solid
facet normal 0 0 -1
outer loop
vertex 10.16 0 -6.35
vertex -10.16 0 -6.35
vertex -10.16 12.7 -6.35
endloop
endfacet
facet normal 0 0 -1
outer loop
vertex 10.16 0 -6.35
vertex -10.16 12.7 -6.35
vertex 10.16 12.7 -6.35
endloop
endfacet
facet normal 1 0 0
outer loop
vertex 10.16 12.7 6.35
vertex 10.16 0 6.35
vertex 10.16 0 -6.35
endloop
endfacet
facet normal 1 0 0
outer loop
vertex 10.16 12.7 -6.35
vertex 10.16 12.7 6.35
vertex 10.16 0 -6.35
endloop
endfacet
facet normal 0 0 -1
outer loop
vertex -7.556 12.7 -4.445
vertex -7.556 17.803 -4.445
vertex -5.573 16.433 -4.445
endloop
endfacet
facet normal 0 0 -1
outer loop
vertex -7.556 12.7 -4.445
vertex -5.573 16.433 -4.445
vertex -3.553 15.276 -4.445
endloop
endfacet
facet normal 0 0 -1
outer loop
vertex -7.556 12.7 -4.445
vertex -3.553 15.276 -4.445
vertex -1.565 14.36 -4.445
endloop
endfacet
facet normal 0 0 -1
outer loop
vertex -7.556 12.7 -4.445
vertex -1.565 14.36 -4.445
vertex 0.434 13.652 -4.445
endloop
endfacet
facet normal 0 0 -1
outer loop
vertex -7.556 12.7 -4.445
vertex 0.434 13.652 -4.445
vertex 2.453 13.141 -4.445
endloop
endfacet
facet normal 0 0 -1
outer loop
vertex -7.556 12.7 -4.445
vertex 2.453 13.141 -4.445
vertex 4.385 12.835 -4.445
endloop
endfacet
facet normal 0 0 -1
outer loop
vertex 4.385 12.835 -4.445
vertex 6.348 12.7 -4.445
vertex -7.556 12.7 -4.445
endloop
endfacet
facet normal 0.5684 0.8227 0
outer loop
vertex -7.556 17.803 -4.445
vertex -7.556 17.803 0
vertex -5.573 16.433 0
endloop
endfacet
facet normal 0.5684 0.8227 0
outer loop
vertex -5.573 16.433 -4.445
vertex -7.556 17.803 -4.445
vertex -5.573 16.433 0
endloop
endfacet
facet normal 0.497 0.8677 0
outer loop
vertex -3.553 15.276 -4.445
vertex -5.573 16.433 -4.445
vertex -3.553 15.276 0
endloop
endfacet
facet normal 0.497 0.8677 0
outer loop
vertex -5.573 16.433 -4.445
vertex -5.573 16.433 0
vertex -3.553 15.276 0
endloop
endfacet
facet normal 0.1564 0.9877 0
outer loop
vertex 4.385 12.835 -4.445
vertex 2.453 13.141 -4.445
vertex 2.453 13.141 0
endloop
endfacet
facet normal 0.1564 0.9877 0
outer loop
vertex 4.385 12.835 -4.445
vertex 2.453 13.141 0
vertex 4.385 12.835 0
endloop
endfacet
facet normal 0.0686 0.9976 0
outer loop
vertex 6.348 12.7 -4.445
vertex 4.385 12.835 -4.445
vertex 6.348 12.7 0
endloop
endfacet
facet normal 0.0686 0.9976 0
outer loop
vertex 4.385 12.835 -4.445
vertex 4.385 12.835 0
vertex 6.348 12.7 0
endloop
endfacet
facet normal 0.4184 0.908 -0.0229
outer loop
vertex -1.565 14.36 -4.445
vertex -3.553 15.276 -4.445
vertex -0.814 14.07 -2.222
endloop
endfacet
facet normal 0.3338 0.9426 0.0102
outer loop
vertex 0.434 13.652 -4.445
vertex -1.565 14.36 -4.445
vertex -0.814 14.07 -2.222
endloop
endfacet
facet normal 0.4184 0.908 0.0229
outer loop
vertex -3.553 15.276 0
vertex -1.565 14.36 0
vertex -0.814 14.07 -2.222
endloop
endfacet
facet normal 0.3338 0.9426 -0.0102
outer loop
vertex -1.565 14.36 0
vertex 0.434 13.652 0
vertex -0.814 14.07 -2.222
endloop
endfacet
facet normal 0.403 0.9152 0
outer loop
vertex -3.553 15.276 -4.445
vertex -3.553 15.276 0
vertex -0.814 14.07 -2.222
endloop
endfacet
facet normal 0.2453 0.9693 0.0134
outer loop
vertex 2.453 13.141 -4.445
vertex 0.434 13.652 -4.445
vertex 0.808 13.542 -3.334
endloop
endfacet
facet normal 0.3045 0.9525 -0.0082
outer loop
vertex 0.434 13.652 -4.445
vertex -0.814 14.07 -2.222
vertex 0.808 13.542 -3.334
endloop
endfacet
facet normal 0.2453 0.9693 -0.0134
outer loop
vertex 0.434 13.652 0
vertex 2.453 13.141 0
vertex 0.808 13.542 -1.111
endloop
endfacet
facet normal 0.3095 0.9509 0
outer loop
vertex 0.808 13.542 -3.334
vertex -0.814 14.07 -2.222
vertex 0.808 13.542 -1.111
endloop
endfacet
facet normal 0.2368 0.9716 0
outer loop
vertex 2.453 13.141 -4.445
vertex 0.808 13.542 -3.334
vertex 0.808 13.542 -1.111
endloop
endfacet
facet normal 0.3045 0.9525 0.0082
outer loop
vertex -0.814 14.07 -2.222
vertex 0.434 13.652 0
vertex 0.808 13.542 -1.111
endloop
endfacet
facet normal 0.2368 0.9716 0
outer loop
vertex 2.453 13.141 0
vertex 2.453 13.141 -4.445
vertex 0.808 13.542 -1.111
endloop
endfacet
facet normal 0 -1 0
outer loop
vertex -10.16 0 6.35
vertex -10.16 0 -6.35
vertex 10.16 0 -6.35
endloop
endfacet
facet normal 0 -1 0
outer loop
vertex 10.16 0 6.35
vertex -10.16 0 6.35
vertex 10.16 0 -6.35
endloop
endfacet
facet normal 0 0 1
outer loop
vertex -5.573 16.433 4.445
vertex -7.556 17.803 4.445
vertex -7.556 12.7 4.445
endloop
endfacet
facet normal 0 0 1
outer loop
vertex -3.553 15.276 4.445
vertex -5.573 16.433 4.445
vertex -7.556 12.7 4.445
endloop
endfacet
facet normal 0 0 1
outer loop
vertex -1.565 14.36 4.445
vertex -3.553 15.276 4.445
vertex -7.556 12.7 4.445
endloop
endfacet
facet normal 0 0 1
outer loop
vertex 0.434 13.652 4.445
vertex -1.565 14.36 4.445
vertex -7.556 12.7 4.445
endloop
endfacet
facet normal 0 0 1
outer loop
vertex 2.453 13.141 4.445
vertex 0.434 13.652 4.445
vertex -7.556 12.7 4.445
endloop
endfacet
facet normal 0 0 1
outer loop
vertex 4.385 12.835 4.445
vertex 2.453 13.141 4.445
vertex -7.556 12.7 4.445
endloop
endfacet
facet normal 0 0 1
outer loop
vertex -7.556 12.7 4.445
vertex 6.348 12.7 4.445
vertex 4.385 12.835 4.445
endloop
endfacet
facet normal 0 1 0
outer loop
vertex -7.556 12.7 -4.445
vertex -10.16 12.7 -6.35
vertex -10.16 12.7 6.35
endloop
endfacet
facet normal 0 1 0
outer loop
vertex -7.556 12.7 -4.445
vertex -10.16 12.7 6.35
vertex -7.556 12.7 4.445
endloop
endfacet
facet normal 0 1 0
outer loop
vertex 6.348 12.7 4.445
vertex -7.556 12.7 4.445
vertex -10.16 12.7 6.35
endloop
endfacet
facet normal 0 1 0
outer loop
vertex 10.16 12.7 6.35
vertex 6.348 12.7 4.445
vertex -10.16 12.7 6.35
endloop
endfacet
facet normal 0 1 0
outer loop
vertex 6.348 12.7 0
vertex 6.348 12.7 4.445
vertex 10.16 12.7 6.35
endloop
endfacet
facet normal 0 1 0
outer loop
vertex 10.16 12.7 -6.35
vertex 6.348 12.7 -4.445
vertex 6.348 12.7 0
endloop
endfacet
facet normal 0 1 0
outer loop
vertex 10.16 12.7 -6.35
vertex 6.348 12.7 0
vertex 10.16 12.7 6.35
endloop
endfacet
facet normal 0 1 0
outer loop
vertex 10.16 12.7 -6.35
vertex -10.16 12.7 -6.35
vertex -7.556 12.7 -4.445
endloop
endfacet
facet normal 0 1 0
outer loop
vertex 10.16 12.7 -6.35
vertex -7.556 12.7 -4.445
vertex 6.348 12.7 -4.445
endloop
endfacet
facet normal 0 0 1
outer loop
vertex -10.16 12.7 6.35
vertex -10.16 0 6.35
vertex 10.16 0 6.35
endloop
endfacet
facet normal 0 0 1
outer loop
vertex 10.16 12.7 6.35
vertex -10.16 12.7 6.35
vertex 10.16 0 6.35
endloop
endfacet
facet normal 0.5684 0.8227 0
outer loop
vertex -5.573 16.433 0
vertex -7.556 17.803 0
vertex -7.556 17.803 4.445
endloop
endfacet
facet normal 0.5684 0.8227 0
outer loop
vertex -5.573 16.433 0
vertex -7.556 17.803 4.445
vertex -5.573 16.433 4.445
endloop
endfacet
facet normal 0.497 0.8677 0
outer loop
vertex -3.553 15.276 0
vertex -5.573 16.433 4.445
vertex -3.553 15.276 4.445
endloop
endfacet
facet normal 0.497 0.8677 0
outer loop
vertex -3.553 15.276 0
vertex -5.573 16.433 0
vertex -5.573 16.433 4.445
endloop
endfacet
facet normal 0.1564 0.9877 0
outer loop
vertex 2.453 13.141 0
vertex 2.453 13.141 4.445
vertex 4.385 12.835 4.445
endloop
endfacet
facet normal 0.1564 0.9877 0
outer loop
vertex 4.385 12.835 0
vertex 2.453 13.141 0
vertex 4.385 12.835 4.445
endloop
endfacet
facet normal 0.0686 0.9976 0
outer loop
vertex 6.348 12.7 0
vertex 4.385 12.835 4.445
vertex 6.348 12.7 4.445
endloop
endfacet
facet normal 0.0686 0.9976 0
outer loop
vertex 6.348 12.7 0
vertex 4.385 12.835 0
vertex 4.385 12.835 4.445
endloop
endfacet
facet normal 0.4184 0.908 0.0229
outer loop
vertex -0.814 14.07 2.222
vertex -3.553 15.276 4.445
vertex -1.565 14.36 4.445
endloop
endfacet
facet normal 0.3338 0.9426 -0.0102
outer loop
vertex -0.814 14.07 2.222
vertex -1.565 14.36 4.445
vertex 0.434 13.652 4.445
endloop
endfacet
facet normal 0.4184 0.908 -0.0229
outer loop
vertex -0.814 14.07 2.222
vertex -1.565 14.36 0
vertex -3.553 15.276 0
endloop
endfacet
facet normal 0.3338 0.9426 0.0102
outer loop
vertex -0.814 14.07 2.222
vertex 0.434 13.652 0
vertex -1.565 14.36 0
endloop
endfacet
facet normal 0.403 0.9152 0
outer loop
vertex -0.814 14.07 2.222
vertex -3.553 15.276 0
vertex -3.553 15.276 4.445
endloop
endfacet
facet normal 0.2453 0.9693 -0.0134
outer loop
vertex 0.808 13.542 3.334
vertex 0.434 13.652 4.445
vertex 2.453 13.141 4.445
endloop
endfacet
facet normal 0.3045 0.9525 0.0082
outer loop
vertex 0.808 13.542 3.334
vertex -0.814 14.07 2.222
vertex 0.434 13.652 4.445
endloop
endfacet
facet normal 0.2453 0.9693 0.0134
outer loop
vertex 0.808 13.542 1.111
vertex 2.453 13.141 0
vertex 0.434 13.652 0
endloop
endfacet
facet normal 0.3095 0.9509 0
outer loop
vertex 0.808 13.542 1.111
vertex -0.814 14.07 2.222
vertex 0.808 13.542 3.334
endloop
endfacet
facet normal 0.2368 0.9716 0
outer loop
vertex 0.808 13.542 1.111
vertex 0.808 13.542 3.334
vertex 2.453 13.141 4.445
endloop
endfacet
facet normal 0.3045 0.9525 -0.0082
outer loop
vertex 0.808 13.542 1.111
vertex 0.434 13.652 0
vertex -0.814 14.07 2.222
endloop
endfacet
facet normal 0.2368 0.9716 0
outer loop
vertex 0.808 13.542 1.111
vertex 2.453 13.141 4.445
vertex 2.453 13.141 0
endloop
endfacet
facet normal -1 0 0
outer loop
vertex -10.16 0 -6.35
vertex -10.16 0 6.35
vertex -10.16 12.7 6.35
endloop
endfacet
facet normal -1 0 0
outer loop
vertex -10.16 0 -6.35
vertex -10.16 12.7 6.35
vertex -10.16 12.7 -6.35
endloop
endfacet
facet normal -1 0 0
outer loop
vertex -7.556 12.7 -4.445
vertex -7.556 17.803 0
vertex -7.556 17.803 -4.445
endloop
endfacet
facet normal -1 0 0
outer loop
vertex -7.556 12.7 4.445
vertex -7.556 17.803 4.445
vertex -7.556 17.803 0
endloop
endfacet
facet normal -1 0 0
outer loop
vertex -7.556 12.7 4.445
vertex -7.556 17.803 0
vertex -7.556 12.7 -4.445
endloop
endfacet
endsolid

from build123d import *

# Parameters (mm, degrees)
SKETCH1_W           = 20.32
SKETCH1_H           = 12.7
BOSS_EXTRUDE1_DEPTH = 12.7
BOSS_EXTRUDE2_DEPTH = 4.445


with BuildPart() as part:
    # Sketch1 → Boss-Extrude1 (new body)
    with BuildSketch(Plane(origin=(0, 0, 0), x_dir=(1, 0, 0), z_dir=(0, 1, 0))):
        Rectangle(SKETCH1_W, SKETCH1_H)
    extrude(amount=BOSS_EXTRUDE1_DEPTH)

    # Sketch2 → Boss-Extrude2 (add, symmetric)
    with BuildSketch(Plane.XY):
        with BuildLine():
            Line((-7.555612539, 17.803216518), (-7.555612539, 12.7))
            Line((-7.555612539, 12.7), (6.347718594, 12.7))
            add(Edge.make_bspline(
                [(-7.555612539, 17.803216518), (-1.024019713, 12.888036176), (6.347718594, 12.7)],
                knots=[0, 0, 0, 0.926306801, 0.926306801, 0.926306801], degree=2))
        make_face()
    extrude(amount=BOSS_EXTRUDE2_DEPTH, both=True)


solid = part.part
